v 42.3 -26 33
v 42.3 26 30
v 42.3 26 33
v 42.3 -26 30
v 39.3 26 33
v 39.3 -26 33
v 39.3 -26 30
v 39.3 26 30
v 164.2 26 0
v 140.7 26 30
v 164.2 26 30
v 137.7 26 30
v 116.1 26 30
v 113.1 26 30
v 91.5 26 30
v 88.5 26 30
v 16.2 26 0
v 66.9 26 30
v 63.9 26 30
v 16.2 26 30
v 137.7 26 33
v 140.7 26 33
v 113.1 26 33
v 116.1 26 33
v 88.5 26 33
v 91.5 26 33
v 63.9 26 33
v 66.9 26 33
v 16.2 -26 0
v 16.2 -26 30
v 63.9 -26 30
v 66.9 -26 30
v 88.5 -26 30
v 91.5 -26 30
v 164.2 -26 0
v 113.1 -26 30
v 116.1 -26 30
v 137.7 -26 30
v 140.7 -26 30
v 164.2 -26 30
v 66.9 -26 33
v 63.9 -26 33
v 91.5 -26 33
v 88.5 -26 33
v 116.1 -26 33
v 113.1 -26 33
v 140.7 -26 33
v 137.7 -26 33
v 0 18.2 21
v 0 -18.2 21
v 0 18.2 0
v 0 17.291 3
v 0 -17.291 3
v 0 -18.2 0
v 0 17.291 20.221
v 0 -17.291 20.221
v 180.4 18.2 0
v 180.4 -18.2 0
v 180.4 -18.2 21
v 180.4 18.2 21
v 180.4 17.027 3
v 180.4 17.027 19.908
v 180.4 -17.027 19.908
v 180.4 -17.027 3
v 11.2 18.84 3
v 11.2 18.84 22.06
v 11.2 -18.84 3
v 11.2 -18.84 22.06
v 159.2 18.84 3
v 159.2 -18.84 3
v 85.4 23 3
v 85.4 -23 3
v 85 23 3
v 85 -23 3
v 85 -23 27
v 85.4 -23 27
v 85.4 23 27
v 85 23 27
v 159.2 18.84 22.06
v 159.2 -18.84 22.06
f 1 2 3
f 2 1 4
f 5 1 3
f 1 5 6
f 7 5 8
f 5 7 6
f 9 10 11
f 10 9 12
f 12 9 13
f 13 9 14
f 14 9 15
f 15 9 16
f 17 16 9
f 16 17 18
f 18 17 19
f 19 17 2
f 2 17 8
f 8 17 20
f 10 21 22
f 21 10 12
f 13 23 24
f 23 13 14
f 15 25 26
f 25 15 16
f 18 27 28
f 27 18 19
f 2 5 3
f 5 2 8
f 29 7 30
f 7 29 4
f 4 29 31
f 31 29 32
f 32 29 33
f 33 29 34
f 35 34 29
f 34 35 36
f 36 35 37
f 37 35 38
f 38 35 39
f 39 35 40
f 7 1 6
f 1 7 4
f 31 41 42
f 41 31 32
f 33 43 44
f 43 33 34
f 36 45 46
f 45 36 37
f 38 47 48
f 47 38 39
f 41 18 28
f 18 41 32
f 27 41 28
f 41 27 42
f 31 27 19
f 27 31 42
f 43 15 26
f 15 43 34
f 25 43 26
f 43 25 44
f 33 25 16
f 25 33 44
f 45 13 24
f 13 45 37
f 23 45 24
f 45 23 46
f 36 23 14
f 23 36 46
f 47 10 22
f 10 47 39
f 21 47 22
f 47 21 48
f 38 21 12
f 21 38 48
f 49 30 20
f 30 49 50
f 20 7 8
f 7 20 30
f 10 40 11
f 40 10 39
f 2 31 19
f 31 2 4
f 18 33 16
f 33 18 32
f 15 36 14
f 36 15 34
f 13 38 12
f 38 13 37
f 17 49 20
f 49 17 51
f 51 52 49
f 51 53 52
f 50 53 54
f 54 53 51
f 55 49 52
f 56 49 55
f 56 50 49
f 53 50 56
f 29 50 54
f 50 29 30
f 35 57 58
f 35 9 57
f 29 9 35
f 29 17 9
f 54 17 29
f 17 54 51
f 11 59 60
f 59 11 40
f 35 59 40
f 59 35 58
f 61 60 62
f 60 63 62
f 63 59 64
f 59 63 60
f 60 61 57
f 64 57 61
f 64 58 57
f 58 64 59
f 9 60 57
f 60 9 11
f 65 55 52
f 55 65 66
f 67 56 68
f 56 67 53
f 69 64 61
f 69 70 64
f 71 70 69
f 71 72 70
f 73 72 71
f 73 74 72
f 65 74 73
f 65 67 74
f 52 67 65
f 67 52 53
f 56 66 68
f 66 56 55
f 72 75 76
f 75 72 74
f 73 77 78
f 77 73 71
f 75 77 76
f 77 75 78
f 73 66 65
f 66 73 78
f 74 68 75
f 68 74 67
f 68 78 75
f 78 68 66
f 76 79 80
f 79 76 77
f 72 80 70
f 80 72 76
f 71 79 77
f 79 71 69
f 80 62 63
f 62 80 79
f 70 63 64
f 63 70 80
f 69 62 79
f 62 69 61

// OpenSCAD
$fn = 32;

// ----------------------------------------------------------------------
// Faired channel: 180 x 52 x 30 mm, 3 mm walls, faired ends
// ----------------------------------------------------------------------

// --- parameters (mm) ---
length = 180;             // channel length
width = 52;               // channel width at mid length
height = 30;              // channel height at mid length
wall = 3;                 // side wall thickness
floor_t = 3;              // floor thickness
end_w = 36.4;             // faired end width
end_h = 21;               // faired end height
ribs = 5;                 // stiffening ribs on the top
rib_t = 3;                // rib thickness
rib_h = 3;                // rib height

difference() {
  union() {
    hull() {
      translate([0, -18.2, 0]) cube([0.4, 36.4, 21]);
      translate([16.2, -26, 0]) cube([0.4, 52, 30]);
    }
    hull() {
      translate([16.2, -26, 0]) cube([0.4, 52, 30]);
      translate([90, -26, 0]) cube([0.4, 52, 30]);
    }
    hull() {
      translate([90, -26, 0]) cube([0.4, 52, 30]);
      translate([163.8, -26, 0]) cube([0.4, 52, 30]);
    }
    hull() {
      translate([163.8, -26, 0]) cube([0.4, 52, 30]);
      translate([180, -18.2, 0]) cube([0.4, 36.4, 21]);
    }
    /* stiffening ribs across the flat top, sunk 0.8 mm into it */
    for (i = [1 : ribs]) {
      translate([16.2 + i * (length - 2 * 16.2) / (ribs + 1) - rib_t / 2, -width / 2, height - 0.8]) cube([rib_t, width, rib_h + 0.8]);
    }
  }
  /* cavity, 5 mm proud of both ends so the ports are cut clean */
  hull() {
    translate([-5, -16.6, 3]) cube([0.4, 33.2, 16.4]);
    translate([11.2, -18.84, 3]) cube([0.4, 37.68, 19.06]);
  }
  hull() {
    translate([11.2, -18.84, 3]) cube([0.4, 37.68, 19.06]);
    translate([85, -23, 3]) cube([0.4, 46, 24]);
  }
  hull() {
    translate([85, -23, 3]) cube([0.4, 46, 24]);
    translate([158.8, -18.84, 3]) cube([0.4, 37.68, 19.06]);
  }
  hull() {
    translate([158.8, -18.84, 3]) cube([0.4, 37.68, 19.06]);
    translate([185, -16.6, 3]) cube([0.4, 33.2, 16.4]);
  }
}
